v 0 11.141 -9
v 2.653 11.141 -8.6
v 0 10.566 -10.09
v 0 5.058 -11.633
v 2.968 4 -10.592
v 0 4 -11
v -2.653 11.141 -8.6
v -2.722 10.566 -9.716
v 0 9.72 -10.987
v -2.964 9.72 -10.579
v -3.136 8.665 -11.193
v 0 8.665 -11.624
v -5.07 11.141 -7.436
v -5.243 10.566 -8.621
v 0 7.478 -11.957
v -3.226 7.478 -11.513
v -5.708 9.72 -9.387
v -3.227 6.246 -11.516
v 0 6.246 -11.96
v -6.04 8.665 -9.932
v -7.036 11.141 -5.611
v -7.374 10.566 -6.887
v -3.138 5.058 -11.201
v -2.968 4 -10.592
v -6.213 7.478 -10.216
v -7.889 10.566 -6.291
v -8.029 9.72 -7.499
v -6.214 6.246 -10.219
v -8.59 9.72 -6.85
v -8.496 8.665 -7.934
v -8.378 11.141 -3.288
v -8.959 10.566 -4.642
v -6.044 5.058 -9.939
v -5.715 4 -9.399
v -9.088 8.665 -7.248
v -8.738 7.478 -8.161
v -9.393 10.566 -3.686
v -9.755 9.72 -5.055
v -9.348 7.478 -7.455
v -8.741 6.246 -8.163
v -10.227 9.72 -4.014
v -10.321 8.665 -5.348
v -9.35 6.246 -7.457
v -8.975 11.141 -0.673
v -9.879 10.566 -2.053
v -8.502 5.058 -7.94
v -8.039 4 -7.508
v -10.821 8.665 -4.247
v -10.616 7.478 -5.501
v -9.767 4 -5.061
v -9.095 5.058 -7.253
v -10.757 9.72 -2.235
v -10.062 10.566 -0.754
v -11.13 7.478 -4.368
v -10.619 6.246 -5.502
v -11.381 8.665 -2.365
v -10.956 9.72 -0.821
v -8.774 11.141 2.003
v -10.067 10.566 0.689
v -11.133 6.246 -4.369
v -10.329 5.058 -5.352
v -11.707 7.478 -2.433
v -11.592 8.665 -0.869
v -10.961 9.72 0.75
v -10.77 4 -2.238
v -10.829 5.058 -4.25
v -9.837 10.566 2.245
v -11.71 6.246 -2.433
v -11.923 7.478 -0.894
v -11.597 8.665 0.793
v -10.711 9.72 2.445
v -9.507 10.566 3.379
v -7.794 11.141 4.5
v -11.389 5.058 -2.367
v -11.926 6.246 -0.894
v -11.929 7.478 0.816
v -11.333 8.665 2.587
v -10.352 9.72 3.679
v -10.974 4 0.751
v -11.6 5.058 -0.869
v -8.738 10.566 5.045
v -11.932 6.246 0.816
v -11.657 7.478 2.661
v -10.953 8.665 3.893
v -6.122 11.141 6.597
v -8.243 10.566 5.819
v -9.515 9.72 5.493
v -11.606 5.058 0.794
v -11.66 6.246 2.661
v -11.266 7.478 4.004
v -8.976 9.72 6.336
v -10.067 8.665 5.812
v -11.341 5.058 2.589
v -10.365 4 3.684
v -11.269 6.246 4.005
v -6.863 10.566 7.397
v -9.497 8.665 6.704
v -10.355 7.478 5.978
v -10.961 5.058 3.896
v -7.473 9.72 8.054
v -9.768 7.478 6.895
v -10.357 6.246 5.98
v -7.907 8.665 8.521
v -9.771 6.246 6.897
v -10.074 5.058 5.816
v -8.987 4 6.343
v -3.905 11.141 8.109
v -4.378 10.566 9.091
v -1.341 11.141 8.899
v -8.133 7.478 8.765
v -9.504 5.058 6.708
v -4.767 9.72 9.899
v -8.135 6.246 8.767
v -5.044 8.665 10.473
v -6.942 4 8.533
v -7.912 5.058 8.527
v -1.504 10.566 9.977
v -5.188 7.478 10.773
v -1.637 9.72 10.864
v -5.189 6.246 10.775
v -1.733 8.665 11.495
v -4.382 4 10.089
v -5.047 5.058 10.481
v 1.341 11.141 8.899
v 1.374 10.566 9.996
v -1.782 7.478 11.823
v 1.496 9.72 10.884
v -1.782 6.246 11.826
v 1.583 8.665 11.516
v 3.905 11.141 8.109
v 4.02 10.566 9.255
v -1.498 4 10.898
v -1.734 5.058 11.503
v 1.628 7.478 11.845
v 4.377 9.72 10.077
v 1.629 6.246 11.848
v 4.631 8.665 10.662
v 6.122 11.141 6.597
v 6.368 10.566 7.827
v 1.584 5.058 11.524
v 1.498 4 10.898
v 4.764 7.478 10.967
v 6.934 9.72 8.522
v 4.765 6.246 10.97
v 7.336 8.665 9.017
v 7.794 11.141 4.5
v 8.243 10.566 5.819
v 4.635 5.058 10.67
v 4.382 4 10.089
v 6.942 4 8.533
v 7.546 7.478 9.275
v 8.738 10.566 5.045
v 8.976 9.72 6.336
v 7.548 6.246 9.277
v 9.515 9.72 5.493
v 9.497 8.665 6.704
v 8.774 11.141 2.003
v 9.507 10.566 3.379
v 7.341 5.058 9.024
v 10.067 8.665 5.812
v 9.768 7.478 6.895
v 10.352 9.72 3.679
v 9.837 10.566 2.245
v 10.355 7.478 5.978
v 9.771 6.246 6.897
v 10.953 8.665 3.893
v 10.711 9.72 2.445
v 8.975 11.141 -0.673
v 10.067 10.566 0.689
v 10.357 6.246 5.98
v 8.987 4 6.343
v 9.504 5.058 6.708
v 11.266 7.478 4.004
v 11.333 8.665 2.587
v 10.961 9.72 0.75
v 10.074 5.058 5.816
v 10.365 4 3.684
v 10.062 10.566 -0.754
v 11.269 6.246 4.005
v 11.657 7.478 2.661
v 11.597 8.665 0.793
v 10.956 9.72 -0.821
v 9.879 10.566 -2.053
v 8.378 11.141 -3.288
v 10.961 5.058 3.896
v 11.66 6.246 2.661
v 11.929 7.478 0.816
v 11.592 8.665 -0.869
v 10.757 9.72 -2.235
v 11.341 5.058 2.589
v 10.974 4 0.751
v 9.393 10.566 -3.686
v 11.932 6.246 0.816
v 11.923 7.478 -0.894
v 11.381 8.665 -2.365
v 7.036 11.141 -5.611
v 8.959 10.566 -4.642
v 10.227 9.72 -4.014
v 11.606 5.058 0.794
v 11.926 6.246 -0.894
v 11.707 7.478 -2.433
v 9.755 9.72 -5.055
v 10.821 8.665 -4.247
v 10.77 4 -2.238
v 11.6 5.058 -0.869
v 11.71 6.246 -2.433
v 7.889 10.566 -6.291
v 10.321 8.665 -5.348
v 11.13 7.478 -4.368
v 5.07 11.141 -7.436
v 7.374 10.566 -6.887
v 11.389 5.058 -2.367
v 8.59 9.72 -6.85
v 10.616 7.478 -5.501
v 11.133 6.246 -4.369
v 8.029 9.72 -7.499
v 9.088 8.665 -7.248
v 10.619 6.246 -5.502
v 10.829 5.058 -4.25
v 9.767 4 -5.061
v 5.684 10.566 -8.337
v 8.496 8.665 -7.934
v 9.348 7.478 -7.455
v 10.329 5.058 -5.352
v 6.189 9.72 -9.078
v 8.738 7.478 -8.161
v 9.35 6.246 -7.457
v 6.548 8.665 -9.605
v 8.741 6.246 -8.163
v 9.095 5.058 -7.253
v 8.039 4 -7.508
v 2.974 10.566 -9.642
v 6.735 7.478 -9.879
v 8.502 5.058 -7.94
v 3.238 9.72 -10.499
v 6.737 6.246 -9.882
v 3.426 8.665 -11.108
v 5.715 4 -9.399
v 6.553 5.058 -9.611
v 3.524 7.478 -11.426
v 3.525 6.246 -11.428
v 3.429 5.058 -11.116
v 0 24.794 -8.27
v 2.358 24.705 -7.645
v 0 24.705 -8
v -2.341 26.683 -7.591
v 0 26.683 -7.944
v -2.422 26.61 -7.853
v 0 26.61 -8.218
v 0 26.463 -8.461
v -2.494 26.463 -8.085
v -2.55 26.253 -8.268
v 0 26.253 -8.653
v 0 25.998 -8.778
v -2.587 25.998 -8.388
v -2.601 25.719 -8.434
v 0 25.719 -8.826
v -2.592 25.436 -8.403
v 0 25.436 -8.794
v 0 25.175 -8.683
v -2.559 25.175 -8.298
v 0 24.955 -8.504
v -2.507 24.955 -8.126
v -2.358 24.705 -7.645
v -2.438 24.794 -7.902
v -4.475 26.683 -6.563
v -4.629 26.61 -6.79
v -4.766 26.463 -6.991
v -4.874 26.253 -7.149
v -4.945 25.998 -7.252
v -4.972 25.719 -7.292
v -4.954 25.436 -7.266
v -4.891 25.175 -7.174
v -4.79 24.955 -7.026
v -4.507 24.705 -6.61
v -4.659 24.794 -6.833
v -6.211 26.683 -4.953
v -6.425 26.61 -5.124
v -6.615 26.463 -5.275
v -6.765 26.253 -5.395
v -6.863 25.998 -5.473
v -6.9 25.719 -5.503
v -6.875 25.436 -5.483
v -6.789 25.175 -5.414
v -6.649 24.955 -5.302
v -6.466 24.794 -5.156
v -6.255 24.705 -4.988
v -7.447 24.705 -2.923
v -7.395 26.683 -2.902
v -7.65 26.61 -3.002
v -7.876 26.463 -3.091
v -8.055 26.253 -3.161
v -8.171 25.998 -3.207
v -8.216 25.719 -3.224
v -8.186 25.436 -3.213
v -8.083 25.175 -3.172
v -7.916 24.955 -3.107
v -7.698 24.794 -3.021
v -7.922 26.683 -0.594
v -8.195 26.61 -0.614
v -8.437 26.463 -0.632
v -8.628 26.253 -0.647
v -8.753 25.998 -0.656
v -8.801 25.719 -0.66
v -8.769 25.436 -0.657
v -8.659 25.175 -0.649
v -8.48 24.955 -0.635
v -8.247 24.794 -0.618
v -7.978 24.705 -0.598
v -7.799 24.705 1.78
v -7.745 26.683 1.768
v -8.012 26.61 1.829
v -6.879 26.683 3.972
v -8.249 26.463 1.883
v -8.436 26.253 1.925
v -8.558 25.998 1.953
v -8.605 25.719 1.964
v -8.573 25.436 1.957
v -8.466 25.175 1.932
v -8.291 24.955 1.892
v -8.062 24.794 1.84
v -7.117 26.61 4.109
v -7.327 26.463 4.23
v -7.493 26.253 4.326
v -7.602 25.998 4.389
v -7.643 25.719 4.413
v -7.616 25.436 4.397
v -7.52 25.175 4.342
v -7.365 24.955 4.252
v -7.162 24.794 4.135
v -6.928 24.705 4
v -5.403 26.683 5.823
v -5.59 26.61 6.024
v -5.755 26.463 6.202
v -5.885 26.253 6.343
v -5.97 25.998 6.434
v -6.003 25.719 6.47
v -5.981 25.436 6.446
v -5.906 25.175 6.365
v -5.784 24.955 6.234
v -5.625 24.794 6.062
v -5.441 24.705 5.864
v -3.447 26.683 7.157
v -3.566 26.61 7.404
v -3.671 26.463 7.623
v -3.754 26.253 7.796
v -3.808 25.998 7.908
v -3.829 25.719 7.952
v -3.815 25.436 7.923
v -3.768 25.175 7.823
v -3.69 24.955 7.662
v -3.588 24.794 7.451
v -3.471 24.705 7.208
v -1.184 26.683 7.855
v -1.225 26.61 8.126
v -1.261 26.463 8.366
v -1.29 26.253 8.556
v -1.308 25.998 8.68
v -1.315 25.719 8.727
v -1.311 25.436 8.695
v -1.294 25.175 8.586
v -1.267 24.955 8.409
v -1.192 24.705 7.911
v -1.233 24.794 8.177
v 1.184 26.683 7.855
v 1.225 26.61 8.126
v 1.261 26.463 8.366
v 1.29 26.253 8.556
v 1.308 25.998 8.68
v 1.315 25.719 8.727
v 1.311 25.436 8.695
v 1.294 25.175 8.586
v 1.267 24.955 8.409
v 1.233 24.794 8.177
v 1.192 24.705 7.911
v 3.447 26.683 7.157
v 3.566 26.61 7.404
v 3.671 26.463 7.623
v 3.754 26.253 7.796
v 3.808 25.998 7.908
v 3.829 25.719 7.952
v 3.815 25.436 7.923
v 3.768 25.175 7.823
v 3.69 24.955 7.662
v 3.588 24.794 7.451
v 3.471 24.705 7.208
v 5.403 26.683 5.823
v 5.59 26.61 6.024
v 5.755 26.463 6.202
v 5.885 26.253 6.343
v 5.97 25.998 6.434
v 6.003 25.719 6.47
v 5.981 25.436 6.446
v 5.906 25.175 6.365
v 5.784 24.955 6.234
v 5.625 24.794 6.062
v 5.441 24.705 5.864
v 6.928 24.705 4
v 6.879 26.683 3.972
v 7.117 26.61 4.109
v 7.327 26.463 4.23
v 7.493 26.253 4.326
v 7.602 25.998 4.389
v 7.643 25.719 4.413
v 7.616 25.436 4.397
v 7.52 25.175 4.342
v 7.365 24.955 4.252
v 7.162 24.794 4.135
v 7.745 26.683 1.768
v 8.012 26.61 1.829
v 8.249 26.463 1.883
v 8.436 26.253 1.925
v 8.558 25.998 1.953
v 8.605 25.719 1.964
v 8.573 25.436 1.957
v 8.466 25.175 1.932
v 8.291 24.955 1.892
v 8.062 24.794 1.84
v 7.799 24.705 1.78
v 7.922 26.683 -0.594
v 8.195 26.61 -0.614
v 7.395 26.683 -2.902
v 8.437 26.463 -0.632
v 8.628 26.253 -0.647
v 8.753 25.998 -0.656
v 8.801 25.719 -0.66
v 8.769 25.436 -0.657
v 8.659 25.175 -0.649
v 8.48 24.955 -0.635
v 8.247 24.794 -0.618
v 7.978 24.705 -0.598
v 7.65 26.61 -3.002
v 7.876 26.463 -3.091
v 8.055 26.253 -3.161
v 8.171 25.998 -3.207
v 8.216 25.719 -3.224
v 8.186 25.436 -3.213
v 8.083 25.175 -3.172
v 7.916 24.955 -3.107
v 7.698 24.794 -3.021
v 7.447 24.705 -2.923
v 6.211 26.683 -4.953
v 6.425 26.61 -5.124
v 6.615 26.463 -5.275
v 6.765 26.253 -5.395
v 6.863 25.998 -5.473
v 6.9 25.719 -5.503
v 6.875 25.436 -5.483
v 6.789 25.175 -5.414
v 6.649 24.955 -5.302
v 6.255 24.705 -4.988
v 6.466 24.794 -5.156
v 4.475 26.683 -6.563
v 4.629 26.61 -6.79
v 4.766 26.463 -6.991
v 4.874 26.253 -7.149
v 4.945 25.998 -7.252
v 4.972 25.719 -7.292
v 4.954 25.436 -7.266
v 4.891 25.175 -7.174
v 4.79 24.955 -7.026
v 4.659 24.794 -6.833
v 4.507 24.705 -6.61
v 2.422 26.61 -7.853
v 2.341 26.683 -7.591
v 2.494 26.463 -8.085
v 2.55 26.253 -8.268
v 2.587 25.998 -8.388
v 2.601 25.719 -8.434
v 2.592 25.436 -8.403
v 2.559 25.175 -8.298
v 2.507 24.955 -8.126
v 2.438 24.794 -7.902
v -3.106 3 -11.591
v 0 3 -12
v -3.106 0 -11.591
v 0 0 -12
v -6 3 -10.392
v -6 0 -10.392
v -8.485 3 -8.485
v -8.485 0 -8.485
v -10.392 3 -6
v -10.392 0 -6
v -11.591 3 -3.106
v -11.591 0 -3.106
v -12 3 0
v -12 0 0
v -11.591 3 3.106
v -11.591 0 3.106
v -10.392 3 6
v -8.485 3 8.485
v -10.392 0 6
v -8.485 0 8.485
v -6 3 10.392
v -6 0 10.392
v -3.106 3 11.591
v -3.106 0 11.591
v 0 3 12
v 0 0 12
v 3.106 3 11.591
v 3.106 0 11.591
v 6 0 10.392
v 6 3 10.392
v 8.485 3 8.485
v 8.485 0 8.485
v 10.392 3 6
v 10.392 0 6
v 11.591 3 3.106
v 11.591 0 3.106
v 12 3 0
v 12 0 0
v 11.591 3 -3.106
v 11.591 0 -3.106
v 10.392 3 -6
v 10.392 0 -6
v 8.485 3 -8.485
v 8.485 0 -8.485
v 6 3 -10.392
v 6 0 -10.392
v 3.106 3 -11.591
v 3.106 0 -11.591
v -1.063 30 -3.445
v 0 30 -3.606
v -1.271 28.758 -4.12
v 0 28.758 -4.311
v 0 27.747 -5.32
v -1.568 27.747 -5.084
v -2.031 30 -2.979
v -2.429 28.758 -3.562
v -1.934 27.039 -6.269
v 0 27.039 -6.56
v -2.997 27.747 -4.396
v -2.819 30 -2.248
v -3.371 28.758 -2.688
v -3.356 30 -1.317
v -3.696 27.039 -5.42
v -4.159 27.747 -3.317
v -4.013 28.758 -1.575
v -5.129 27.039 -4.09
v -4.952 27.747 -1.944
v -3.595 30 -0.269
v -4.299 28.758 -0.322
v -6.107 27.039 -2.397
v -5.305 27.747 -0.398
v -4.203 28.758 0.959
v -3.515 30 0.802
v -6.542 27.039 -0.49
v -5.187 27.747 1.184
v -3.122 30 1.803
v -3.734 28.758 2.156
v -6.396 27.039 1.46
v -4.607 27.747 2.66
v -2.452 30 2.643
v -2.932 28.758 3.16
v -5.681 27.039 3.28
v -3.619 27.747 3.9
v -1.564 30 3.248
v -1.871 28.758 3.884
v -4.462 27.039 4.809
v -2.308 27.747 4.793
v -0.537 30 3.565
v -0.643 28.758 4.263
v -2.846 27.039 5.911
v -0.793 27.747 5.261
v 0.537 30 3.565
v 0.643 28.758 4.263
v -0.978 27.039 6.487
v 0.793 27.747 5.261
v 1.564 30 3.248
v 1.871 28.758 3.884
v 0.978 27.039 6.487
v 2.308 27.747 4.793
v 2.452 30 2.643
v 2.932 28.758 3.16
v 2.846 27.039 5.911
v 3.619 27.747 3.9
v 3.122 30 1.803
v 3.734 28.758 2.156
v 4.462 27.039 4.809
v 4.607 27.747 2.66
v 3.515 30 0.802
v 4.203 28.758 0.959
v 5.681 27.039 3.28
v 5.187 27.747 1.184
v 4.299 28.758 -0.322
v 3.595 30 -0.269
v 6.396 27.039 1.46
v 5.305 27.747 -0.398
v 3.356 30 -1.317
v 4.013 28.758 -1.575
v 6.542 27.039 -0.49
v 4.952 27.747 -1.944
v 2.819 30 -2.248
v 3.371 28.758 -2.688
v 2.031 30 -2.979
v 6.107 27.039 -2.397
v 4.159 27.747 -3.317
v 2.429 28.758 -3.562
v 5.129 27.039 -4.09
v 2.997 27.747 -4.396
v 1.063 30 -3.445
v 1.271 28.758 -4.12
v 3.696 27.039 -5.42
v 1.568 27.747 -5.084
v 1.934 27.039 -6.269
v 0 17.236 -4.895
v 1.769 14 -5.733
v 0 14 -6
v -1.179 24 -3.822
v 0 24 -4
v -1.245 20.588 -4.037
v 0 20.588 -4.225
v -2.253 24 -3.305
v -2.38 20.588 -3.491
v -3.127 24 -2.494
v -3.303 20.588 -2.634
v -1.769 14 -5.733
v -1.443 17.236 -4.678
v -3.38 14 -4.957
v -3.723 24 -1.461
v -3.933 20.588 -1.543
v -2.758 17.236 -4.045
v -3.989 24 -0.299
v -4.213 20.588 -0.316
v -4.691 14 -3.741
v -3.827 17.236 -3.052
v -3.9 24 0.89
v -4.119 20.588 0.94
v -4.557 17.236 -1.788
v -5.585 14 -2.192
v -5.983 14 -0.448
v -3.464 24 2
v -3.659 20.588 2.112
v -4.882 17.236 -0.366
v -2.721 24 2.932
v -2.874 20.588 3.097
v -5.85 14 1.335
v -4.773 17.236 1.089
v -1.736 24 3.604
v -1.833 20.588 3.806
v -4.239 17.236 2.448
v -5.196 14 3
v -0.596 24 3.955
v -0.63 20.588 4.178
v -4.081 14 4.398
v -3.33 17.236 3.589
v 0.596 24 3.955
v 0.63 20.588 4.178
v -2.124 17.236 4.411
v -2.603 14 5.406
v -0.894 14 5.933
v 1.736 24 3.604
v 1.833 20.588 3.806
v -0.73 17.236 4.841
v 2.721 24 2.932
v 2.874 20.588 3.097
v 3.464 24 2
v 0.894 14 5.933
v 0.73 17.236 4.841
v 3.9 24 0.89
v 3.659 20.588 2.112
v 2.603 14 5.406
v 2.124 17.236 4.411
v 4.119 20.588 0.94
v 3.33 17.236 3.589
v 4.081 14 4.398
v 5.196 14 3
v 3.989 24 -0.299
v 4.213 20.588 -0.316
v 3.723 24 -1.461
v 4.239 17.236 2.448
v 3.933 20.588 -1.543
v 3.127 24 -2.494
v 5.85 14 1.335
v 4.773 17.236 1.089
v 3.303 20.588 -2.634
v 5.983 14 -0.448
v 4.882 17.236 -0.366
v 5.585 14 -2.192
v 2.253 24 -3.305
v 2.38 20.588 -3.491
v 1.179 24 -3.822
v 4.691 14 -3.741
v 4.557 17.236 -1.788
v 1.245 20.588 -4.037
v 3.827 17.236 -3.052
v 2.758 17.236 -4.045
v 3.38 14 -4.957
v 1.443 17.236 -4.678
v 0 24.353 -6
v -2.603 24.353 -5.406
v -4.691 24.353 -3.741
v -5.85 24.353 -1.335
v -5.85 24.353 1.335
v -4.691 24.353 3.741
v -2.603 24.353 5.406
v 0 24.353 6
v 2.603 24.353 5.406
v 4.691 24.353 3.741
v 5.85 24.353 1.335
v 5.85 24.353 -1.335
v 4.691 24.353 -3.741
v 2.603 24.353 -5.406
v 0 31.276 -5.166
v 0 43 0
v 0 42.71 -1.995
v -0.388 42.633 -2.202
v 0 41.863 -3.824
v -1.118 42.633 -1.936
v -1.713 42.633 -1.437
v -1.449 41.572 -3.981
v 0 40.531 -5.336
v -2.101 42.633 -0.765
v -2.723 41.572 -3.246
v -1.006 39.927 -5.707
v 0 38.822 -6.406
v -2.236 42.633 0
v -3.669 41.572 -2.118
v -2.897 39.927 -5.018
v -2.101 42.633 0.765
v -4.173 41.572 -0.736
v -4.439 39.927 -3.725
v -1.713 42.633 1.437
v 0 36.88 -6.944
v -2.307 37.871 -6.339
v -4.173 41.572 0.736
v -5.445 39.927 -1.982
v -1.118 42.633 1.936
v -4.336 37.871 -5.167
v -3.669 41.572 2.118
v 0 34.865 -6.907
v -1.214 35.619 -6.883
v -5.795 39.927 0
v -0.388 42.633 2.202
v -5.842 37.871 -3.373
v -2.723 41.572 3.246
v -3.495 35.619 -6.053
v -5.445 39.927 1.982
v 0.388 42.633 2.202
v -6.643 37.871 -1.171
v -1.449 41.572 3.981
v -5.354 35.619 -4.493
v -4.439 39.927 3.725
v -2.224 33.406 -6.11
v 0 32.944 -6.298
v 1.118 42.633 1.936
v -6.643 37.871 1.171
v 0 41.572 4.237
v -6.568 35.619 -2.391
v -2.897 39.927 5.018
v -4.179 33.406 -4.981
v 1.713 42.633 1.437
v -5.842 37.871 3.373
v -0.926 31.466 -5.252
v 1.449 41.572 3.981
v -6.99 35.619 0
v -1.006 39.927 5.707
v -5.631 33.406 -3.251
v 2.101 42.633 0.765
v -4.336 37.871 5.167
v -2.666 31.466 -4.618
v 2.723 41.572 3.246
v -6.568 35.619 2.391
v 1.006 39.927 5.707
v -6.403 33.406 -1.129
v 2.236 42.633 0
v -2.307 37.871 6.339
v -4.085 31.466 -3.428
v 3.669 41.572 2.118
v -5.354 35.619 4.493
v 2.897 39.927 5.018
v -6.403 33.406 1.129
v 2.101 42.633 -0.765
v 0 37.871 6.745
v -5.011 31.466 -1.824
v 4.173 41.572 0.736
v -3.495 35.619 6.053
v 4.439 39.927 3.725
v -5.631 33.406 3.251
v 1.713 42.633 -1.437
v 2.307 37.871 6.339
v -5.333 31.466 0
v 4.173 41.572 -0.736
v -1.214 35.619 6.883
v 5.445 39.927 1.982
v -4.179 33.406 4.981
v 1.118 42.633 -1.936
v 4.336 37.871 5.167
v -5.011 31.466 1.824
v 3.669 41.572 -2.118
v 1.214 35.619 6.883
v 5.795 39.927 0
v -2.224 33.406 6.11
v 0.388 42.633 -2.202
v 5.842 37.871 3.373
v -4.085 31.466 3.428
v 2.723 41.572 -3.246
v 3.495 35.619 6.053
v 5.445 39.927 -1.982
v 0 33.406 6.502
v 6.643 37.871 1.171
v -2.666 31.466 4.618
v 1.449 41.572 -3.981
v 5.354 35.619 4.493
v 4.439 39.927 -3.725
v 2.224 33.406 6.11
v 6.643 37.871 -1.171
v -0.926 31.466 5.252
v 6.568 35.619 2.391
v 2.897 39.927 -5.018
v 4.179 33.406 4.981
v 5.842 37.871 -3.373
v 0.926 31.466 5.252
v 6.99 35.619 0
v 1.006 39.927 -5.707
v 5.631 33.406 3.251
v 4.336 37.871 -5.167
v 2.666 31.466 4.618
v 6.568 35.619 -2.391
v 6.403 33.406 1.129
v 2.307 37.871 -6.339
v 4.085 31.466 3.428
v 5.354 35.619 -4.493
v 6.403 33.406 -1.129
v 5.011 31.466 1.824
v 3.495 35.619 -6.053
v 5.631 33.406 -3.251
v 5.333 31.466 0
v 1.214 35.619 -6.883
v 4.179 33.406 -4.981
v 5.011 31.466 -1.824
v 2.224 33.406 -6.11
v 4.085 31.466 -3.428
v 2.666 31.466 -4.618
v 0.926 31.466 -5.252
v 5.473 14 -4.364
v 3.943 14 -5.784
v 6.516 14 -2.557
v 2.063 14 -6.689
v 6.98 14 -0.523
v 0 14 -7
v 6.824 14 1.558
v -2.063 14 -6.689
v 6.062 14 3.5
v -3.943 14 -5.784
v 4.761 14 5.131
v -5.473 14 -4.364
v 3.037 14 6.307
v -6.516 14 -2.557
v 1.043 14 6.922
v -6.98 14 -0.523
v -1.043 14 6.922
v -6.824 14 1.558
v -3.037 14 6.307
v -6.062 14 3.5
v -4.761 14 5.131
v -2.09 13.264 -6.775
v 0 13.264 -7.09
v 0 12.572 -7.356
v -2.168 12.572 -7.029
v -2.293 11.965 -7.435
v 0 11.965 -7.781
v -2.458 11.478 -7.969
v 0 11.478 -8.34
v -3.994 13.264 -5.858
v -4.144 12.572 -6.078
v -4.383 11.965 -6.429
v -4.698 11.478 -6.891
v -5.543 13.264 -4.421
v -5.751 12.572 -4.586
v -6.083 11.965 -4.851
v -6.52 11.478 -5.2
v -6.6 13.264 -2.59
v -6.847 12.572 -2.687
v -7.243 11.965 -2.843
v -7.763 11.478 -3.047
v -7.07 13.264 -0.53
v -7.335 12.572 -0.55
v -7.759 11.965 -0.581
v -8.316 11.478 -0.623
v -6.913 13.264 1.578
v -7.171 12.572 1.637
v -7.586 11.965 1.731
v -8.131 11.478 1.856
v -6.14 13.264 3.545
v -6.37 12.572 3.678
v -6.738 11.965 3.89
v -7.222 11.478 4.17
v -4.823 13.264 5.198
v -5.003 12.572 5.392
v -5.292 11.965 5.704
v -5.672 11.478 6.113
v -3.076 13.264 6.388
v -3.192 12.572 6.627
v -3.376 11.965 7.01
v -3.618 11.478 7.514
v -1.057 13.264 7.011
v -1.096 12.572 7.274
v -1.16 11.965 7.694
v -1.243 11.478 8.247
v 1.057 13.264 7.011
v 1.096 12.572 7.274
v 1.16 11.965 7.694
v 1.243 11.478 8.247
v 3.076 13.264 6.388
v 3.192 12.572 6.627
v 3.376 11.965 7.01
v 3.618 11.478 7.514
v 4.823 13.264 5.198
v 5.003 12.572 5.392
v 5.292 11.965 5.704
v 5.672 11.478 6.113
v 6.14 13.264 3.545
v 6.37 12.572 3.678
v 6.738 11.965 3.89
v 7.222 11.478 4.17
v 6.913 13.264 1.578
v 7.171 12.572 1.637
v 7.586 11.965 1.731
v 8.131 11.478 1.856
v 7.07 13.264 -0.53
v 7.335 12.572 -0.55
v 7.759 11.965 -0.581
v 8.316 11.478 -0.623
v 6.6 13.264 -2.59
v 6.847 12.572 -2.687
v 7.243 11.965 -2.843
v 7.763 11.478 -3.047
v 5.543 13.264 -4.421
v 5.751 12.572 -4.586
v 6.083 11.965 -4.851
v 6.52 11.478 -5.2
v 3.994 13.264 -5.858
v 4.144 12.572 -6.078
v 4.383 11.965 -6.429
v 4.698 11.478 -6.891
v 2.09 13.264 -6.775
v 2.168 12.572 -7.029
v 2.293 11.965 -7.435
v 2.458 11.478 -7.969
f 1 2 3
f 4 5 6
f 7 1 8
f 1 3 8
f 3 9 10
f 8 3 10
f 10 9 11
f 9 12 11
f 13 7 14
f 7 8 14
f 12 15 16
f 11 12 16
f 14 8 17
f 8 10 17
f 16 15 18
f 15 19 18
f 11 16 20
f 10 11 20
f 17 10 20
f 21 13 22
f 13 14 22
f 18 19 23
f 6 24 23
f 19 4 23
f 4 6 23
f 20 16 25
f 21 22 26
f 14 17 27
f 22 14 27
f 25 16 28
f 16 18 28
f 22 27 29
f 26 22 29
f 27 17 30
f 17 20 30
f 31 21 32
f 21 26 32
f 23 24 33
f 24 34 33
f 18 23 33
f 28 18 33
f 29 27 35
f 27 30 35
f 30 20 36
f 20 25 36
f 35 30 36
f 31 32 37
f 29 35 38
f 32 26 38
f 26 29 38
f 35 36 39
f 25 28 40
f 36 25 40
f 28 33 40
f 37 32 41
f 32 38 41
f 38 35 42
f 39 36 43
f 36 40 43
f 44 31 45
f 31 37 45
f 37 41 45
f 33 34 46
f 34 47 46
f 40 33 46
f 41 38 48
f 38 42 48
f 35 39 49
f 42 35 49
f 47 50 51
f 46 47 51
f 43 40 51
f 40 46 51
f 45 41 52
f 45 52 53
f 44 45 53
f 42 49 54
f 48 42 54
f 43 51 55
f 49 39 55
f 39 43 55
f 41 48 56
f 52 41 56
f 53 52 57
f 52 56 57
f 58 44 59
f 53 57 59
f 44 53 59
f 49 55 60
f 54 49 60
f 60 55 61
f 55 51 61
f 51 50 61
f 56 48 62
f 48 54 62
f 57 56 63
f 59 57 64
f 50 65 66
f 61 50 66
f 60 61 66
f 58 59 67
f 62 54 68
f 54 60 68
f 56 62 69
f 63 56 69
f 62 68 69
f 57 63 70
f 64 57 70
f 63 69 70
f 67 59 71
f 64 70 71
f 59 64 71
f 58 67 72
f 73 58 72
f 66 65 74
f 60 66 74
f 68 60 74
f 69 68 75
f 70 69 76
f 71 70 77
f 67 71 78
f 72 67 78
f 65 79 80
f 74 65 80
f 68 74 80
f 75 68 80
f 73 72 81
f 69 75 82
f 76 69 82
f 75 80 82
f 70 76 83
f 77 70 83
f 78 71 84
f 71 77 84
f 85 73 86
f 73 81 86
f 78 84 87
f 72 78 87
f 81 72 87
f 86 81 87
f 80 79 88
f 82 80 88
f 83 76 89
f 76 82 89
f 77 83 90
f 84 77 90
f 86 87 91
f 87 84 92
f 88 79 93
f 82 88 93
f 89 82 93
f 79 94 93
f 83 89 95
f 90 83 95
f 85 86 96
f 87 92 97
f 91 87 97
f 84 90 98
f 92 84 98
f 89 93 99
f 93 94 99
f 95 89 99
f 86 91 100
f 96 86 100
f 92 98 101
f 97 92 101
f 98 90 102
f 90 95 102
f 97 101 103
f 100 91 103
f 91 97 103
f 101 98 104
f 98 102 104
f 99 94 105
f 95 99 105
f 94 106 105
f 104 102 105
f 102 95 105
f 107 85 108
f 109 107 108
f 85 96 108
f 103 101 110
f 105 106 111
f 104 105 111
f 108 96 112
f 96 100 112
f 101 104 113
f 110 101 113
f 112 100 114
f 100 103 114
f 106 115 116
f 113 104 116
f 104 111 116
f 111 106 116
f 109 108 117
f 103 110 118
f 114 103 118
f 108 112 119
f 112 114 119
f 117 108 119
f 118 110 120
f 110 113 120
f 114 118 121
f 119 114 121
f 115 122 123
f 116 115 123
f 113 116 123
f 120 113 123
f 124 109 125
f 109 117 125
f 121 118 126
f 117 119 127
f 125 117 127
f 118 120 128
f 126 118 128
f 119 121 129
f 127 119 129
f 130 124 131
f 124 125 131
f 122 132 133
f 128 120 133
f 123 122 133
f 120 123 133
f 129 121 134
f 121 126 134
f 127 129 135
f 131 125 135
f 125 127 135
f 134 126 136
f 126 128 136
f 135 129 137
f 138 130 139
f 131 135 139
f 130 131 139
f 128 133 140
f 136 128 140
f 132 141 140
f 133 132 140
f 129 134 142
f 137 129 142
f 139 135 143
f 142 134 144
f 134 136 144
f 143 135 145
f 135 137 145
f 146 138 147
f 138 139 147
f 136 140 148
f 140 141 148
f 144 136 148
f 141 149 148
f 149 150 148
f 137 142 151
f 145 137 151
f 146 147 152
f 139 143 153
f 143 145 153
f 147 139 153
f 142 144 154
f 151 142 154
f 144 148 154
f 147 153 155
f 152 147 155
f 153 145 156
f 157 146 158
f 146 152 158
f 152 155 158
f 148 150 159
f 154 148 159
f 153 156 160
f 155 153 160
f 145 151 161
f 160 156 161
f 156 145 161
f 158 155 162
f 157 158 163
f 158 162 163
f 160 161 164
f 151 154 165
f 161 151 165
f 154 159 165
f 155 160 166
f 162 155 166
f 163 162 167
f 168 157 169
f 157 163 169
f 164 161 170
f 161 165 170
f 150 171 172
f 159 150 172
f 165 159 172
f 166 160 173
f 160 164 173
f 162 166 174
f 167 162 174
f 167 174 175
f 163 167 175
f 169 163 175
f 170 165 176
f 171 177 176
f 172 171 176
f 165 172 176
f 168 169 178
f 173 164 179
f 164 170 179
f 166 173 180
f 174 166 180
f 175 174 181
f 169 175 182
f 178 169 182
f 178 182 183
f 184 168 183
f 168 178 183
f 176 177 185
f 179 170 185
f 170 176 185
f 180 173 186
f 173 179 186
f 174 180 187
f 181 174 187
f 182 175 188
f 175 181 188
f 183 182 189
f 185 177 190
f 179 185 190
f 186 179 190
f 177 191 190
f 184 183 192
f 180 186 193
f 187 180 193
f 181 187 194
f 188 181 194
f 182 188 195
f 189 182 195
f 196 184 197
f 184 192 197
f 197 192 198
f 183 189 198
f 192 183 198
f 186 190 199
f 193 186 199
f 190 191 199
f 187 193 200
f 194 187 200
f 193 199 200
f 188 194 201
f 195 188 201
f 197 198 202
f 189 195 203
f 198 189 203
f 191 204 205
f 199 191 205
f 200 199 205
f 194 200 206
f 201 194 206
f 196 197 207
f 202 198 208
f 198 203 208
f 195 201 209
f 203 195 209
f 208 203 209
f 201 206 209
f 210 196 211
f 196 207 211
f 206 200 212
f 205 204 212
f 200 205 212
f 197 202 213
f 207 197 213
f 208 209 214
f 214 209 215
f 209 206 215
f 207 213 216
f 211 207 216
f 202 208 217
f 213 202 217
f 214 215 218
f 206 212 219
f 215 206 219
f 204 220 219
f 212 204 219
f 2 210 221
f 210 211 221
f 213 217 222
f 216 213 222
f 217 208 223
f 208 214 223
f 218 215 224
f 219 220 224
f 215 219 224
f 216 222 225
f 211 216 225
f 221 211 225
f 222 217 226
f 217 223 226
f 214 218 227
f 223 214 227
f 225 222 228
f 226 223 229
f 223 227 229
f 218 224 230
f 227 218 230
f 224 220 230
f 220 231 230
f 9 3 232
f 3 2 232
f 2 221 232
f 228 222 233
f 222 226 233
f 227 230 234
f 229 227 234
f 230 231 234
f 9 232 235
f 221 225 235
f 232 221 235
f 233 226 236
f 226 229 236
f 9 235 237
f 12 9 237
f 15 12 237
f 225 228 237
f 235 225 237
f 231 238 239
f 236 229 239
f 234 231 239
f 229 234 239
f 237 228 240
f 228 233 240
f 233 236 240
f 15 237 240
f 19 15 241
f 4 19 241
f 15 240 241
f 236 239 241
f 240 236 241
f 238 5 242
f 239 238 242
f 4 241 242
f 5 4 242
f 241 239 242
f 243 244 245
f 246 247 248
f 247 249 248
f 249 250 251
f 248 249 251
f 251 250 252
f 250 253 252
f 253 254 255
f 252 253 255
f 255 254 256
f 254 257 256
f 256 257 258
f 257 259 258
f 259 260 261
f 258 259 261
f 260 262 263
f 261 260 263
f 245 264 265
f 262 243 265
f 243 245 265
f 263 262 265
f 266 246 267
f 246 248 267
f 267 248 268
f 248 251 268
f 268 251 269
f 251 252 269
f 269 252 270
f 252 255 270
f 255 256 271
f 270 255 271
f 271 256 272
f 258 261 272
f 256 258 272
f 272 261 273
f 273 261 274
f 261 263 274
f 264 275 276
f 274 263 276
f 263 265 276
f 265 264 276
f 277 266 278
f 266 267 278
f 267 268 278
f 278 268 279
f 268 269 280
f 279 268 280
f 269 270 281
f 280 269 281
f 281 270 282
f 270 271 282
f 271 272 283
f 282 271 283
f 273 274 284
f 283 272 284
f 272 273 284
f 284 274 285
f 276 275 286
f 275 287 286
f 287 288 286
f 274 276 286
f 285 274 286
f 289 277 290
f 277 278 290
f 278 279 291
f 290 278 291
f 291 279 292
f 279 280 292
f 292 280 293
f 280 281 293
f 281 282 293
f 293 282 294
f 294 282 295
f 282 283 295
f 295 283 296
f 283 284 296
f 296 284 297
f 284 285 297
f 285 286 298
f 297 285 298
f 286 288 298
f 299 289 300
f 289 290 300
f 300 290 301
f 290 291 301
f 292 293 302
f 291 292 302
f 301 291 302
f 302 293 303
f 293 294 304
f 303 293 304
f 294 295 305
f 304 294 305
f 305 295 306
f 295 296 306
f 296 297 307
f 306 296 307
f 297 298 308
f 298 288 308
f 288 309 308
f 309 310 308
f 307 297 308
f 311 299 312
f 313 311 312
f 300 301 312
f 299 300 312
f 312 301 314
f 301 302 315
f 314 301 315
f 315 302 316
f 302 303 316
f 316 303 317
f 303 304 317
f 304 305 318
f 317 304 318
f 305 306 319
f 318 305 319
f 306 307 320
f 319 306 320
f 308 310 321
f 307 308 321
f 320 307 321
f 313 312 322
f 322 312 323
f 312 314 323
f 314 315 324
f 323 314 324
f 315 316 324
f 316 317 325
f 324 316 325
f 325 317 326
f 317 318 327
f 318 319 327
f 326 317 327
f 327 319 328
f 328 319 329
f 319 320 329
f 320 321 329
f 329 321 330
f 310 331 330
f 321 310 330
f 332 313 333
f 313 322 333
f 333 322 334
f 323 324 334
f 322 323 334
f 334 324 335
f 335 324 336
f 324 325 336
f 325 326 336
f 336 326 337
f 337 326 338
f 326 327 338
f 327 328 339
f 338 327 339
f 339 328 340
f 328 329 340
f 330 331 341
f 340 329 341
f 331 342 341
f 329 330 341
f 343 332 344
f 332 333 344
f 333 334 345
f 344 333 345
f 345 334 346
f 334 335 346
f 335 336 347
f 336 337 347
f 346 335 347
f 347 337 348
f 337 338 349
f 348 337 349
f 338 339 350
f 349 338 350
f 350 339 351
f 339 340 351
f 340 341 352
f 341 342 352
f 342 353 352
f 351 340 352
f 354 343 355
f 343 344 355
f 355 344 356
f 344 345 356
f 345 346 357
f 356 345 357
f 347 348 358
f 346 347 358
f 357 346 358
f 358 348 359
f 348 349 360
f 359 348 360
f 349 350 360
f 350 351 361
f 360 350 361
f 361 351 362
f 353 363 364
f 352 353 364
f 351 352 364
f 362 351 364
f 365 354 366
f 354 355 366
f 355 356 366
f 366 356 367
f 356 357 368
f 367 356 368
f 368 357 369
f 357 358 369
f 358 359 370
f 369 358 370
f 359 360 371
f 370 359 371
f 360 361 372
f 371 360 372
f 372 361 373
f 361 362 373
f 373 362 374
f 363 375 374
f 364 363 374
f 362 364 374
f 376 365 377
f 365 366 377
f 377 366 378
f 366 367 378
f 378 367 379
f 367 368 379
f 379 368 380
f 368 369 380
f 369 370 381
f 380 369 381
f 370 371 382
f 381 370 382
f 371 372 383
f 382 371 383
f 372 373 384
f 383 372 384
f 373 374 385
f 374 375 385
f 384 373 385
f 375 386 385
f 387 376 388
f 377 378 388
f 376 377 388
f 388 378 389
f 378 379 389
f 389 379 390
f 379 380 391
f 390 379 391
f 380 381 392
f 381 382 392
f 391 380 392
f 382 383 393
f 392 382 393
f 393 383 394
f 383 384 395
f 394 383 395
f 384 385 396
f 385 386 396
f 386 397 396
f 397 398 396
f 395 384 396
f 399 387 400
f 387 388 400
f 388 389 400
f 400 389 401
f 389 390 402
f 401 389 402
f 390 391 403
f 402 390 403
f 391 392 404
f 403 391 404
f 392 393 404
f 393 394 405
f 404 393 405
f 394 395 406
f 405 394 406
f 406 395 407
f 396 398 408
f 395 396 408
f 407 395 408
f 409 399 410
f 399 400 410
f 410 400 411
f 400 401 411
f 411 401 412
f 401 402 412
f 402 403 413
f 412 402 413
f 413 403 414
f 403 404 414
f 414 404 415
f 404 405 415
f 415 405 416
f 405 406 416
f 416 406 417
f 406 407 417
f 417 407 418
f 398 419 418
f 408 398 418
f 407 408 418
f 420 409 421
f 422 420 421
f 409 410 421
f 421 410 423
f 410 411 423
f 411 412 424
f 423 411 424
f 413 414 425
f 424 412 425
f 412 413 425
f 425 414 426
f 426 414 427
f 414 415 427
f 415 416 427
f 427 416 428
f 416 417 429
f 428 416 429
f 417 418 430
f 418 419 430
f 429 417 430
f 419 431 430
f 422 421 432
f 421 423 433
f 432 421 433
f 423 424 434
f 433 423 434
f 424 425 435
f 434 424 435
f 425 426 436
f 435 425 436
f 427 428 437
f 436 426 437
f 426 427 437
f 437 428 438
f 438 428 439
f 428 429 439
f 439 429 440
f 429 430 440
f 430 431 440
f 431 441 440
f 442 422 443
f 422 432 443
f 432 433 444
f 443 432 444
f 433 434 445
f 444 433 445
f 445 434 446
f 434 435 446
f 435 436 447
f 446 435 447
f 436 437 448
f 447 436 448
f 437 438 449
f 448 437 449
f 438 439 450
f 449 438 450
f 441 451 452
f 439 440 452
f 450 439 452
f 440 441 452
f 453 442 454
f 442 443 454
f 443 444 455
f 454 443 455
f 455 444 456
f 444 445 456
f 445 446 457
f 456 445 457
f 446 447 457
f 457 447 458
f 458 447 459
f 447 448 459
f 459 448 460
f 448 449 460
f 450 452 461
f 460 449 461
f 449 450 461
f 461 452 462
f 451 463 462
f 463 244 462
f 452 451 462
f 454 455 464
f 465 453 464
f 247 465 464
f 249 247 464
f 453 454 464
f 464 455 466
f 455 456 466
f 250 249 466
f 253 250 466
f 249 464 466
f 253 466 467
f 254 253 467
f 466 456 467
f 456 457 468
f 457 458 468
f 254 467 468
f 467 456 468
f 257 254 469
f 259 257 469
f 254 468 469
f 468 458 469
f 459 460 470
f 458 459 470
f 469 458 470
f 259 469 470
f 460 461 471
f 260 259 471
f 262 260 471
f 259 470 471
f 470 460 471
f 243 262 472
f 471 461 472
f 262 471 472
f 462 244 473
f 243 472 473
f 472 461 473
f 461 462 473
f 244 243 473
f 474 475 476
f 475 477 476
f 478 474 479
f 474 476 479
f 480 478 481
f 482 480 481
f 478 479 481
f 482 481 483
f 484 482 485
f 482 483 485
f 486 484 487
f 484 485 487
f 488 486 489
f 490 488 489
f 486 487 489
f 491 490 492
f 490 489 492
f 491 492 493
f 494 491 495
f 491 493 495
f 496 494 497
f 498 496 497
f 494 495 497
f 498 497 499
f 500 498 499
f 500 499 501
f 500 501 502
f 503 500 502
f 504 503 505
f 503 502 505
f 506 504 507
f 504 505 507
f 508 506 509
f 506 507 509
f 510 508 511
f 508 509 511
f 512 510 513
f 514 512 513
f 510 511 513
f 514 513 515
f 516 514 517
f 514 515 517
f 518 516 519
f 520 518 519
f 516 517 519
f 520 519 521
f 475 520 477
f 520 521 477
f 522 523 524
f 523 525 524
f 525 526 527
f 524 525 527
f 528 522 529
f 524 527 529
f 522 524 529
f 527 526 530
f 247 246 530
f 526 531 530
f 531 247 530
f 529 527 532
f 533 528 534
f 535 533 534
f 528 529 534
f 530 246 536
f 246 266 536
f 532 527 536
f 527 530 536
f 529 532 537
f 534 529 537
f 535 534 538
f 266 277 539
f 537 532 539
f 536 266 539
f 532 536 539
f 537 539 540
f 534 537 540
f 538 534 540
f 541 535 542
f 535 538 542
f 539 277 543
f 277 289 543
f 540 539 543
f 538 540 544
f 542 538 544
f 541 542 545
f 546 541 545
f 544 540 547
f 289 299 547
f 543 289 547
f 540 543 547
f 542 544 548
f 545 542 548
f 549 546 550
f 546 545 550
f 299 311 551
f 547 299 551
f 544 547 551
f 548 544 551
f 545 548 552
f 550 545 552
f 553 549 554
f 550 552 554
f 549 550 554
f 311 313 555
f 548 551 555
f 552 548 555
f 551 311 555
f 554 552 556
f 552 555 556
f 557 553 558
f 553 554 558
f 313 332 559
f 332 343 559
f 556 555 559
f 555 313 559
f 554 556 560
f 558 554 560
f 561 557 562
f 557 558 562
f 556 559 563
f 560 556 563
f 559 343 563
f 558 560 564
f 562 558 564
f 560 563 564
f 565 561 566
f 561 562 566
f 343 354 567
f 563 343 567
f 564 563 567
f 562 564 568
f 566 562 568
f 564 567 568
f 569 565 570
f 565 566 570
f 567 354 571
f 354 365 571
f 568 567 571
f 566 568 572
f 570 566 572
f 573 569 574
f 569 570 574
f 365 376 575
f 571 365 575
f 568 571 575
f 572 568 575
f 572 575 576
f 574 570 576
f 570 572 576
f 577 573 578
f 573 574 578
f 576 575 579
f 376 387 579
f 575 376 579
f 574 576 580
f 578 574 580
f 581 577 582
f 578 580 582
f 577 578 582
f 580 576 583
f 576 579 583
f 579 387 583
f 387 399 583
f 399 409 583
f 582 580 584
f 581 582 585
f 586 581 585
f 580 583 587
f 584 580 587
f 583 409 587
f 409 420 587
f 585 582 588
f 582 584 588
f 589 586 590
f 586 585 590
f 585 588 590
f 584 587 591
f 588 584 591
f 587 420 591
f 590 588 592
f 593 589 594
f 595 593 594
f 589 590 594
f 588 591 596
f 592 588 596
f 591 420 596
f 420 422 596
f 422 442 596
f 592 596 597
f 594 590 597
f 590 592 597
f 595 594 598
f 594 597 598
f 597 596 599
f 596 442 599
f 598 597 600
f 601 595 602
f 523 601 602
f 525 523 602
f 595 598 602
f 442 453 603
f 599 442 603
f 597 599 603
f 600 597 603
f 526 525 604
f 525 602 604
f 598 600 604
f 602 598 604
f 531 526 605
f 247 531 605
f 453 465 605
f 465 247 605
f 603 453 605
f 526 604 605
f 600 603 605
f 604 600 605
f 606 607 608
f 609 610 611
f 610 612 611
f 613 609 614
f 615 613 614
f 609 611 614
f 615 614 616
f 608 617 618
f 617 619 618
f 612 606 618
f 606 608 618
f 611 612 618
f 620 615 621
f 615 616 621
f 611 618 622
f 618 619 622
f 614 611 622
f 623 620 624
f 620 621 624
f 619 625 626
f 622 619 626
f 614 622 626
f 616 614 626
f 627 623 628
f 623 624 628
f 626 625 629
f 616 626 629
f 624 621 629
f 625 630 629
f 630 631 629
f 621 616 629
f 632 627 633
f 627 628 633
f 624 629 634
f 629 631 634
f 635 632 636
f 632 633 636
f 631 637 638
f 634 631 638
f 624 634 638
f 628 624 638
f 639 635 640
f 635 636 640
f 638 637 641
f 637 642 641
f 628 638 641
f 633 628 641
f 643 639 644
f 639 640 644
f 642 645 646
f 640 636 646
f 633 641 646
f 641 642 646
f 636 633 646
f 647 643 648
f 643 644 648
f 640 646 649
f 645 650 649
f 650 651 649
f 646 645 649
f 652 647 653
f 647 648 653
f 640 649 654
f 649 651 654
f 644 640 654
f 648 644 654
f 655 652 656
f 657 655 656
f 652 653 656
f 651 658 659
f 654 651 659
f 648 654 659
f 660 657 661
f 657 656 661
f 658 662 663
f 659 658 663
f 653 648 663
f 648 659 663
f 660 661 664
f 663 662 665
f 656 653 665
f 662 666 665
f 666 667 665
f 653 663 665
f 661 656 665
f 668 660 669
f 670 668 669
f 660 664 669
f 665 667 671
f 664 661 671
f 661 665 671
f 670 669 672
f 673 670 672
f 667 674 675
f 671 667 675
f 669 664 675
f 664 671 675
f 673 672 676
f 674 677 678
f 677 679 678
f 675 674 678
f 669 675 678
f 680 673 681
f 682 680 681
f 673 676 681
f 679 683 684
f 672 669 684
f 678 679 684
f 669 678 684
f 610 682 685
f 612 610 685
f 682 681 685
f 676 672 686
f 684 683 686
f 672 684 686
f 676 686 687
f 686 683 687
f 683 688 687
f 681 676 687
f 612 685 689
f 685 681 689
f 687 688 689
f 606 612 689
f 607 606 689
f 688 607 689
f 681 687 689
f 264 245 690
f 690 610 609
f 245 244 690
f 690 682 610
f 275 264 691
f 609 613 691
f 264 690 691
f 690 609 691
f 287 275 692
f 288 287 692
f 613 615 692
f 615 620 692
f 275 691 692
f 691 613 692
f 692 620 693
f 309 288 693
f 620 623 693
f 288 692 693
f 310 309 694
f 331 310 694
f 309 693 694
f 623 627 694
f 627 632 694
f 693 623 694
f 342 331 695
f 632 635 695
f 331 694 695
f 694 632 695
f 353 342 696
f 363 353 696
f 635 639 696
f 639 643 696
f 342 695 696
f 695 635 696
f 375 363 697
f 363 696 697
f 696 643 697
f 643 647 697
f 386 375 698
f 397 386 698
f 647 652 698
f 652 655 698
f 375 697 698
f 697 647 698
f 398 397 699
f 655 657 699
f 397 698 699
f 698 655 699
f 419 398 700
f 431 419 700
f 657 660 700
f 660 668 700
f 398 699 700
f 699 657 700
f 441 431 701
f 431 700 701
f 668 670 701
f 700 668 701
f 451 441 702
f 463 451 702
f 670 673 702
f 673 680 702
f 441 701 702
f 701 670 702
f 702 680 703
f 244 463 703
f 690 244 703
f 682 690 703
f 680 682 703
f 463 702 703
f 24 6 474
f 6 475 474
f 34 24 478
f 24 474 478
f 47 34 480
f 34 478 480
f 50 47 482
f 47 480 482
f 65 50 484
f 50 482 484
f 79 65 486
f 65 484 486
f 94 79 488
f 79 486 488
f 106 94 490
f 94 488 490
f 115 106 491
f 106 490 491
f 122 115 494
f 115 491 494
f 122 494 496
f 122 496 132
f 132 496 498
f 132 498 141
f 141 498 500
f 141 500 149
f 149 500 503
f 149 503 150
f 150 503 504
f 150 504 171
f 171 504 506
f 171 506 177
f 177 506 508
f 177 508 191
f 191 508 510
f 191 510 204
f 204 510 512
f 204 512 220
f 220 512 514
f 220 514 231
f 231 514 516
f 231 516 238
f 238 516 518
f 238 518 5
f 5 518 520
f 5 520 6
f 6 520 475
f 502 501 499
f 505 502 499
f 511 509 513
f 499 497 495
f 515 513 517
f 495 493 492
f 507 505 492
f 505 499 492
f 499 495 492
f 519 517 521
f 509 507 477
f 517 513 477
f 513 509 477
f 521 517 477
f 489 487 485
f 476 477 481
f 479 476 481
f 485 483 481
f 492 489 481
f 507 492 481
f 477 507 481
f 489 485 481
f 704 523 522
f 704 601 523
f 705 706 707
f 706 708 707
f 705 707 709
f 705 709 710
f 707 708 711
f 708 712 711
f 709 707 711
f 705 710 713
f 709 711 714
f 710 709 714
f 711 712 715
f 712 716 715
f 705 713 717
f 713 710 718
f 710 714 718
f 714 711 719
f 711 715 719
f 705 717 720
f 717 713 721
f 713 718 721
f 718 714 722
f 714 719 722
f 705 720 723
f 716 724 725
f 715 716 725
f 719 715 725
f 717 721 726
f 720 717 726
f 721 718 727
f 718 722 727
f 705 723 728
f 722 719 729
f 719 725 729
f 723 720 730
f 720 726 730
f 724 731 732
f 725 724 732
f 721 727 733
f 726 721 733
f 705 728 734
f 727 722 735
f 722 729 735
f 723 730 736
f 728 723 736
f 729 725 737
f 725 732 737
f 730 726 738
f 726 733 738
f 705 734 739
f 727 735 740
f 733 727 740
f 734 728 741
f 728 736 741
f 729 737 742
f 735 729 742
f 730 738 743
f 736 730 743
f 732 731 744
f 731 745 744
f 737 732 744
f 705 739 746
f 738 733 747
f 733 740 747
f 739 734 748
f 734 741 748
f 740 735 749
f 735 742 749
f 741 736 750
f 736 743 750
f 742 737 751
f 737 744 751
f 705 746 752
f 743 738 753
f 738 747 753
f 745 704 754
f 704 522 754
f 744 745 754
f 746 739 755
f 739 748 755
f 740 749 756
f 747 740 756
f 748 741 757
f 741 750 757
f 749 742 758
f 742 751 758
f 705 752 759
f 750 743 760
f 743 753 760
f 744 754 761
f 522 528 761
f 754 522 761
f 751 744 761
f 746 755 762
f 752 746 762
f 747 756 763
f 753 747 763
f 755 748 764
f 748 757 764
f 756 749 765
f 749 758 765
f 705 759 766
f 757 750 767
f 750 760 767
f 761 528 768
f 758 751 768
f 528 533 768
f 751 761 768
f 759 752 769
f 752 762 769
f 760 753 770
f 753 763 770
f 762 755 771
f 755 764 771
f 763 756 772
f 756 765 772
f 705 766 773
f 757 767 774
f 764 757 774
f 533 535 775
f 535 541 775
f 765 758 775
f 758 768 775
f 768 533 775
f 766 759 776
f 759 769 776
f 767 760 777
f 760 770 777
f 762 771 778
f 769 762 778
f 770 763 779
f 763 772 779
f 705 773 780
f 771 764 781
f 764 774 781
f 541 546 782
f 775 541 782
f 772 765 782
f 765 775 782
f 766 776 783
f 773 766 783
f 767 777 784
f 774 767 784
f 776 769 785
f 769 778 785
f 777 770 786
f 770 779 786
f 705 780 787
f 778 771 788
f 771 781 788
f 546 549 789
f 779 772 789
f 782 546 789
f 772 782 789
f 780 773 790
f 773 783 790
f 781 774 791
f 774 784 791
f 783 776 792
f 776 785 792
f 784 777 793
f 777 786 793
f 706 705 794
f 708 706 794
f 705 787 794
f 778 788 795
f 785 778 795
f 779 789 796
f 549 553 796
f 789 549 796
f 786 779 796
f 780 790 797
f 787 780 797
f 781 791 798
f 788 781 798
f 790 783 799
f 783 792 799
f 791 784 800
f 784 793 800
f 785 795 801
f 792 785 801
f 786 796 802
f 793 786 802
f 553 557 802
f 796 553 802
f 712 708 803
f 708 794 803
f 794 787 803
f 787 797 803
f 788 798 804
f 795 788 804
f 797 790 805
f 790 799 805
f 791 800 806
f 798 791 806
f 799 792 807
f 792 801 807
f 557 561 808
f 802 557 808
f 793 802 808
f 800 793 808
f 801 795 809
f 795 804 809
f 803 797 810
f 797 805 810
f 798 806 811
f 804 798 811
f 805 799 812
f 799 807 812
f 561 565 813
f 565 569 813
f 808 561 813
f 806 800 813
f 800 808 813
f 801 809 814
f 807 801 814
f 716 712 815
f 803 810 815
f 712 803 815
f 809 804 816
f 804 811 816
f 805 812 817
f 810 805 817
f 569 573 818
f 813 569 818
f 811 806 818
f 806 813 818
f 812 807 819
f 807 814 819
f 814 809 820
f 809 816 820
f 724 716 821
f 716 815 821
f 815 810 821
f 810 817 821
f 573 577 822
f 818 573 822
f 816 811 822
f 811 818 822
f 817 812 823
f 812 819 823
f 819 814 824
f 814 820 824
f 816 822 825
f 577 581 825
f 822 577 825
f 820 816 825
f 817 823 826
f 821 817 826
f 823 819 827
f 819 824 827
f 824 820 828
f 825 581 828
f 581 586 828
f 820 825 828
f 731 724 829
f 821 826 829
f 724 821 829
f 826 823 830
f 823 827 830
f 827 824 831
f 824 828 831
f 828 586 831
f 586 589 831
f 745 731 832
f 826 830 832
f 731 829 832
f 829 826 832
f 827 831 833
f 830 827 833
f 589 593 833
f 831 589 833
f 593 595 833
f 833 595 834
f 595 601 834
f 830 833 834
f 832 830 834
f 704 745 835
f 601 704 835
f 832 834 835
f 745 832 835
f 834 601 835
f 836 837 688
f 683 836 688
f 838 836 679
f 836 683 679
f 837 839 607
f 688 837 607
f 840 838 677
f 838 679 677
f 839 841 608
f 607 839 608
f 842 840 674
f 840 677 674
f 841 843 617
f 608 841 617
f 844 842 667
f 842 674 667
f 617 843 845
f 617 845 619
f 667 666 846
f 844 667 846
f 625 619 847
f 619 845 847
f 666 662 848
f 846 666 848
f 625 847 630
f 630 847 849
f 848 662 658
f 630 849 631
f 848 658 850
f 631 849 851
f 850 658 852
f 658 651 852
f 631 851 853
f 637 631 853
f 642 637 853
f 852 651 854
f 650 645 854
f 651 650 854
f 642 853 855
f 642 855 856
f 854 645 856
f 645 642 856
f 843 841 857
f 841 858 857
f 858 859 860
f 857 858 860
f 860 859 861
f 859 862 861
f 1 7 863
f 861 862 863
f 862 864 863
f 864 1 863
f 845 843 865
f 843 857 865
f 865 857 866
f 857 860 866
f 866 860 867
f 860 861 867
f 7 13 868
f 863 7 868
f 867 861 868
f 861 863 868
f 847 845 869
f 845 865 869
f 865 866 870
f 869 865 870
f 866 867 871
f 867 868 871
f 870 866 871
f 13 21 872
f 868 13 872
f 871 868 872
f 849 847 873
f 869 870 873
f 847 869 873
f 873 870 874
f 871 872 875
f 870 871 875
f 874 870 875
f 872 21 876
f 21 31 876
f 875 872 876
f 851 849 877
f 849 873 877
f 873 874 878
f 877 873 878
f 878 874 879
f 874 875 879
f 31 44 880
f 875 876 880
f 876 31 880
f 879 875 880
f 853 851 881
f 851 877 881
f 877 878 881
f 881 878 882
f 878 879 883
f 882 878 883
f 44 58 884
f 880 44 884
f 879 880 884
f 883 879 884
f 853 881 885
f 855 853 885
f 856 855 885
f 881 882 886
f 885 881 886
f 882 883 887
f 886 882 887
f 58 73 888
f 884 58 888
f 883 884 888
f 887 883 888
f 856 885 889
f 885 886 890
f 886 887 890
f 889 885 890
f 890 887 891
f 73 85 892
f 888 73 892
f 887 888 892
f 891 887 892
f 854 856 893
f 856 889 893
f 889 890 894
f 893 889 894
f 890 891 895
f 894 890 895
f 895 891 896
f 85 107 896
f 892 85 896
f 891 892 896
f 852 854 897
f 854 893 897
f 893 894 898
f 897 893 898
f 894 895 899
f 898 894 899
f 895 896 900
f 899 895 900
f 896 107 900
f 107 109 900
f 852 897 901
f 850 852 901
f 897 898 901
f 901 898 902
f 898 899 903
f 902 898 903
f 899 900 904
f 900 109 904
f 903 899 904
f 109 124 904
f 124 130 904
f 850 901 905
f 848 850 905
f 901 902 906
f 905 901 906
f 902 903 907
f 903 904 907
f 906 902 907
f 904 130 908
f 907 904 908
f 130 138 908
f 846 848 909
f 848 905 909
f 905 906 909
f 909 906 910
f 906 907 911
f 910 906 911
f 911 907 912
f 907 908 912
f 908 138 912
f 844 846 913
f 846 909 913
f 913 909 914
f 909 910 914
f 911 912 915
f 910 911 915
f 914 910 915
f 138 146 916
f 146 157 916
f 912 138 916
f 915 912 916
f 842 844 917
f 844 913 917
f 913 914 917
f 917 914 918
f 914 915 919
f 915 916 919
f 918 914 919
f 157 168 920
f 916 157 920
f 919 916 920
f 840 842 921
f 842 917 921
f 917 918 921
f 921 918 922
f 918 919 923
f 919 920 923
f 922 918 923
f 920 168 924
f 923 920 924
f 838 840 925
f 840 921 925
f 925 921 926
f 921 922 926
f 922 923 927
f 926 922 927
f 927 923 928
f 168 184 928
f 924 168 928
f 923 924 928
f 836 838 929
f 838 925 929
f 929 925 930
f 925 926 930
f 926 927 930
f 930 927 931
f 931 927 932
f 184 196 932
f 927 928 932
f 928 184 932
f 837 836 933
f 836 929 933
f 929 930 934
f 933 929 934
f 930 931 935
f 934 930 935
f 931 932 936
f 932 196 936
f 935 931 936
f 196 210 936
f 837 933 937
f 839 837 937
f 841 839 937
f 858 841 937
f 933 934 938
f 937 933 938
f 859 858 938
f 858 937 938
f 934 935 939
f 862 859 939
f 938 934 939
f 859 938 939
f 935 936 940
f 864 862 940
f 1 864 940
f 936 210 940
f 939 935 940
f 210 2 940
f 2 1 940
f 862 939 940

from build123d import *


with BuildPart() as part:
    # Sketch1 → Revolve1 (revolve)
    with BuildSketch(Plane(origin=(0, 0, 0), x_dir=(0, 0, -1), z_dir=(1, 0, 0))):
        with BuildLine():
            Line((0, 0), (0, 43))
            ThreePointArc((0, 43), (6.745368782, 37.870828693), (3.605551275, 30))
            ThreePointArc((3.605551275, 30), (5.320030077, 27.746998352), (7.94372856, 26.683203135))
            ThreePointArc((7.94372856, 26.683203135), (8.825947362, 25.718554332), (8, 24.705307923))
            Line((8, 24.705307923), (4, 24))
            ThreePointArc((4, 24), (4.504902432, 18.900980486), (6, 14))
            Line((6, 14), (7, 14))
            ThreePointArc((7, 14), (7.549619925, 12.255305385), (9, 11.140657908))
            ThreePointArc((9, 11.140657908), (11.830797515, 8.08311014), (11, 4))
            Line((11, 4), (12, 3))
            Line((12, 3), (12, 0))
            Line((12, 0), (0, 0))
        make_face()
    revolve(axis=Axis((0, 0, 0), (0, 1, 0)))


solid = part.part
